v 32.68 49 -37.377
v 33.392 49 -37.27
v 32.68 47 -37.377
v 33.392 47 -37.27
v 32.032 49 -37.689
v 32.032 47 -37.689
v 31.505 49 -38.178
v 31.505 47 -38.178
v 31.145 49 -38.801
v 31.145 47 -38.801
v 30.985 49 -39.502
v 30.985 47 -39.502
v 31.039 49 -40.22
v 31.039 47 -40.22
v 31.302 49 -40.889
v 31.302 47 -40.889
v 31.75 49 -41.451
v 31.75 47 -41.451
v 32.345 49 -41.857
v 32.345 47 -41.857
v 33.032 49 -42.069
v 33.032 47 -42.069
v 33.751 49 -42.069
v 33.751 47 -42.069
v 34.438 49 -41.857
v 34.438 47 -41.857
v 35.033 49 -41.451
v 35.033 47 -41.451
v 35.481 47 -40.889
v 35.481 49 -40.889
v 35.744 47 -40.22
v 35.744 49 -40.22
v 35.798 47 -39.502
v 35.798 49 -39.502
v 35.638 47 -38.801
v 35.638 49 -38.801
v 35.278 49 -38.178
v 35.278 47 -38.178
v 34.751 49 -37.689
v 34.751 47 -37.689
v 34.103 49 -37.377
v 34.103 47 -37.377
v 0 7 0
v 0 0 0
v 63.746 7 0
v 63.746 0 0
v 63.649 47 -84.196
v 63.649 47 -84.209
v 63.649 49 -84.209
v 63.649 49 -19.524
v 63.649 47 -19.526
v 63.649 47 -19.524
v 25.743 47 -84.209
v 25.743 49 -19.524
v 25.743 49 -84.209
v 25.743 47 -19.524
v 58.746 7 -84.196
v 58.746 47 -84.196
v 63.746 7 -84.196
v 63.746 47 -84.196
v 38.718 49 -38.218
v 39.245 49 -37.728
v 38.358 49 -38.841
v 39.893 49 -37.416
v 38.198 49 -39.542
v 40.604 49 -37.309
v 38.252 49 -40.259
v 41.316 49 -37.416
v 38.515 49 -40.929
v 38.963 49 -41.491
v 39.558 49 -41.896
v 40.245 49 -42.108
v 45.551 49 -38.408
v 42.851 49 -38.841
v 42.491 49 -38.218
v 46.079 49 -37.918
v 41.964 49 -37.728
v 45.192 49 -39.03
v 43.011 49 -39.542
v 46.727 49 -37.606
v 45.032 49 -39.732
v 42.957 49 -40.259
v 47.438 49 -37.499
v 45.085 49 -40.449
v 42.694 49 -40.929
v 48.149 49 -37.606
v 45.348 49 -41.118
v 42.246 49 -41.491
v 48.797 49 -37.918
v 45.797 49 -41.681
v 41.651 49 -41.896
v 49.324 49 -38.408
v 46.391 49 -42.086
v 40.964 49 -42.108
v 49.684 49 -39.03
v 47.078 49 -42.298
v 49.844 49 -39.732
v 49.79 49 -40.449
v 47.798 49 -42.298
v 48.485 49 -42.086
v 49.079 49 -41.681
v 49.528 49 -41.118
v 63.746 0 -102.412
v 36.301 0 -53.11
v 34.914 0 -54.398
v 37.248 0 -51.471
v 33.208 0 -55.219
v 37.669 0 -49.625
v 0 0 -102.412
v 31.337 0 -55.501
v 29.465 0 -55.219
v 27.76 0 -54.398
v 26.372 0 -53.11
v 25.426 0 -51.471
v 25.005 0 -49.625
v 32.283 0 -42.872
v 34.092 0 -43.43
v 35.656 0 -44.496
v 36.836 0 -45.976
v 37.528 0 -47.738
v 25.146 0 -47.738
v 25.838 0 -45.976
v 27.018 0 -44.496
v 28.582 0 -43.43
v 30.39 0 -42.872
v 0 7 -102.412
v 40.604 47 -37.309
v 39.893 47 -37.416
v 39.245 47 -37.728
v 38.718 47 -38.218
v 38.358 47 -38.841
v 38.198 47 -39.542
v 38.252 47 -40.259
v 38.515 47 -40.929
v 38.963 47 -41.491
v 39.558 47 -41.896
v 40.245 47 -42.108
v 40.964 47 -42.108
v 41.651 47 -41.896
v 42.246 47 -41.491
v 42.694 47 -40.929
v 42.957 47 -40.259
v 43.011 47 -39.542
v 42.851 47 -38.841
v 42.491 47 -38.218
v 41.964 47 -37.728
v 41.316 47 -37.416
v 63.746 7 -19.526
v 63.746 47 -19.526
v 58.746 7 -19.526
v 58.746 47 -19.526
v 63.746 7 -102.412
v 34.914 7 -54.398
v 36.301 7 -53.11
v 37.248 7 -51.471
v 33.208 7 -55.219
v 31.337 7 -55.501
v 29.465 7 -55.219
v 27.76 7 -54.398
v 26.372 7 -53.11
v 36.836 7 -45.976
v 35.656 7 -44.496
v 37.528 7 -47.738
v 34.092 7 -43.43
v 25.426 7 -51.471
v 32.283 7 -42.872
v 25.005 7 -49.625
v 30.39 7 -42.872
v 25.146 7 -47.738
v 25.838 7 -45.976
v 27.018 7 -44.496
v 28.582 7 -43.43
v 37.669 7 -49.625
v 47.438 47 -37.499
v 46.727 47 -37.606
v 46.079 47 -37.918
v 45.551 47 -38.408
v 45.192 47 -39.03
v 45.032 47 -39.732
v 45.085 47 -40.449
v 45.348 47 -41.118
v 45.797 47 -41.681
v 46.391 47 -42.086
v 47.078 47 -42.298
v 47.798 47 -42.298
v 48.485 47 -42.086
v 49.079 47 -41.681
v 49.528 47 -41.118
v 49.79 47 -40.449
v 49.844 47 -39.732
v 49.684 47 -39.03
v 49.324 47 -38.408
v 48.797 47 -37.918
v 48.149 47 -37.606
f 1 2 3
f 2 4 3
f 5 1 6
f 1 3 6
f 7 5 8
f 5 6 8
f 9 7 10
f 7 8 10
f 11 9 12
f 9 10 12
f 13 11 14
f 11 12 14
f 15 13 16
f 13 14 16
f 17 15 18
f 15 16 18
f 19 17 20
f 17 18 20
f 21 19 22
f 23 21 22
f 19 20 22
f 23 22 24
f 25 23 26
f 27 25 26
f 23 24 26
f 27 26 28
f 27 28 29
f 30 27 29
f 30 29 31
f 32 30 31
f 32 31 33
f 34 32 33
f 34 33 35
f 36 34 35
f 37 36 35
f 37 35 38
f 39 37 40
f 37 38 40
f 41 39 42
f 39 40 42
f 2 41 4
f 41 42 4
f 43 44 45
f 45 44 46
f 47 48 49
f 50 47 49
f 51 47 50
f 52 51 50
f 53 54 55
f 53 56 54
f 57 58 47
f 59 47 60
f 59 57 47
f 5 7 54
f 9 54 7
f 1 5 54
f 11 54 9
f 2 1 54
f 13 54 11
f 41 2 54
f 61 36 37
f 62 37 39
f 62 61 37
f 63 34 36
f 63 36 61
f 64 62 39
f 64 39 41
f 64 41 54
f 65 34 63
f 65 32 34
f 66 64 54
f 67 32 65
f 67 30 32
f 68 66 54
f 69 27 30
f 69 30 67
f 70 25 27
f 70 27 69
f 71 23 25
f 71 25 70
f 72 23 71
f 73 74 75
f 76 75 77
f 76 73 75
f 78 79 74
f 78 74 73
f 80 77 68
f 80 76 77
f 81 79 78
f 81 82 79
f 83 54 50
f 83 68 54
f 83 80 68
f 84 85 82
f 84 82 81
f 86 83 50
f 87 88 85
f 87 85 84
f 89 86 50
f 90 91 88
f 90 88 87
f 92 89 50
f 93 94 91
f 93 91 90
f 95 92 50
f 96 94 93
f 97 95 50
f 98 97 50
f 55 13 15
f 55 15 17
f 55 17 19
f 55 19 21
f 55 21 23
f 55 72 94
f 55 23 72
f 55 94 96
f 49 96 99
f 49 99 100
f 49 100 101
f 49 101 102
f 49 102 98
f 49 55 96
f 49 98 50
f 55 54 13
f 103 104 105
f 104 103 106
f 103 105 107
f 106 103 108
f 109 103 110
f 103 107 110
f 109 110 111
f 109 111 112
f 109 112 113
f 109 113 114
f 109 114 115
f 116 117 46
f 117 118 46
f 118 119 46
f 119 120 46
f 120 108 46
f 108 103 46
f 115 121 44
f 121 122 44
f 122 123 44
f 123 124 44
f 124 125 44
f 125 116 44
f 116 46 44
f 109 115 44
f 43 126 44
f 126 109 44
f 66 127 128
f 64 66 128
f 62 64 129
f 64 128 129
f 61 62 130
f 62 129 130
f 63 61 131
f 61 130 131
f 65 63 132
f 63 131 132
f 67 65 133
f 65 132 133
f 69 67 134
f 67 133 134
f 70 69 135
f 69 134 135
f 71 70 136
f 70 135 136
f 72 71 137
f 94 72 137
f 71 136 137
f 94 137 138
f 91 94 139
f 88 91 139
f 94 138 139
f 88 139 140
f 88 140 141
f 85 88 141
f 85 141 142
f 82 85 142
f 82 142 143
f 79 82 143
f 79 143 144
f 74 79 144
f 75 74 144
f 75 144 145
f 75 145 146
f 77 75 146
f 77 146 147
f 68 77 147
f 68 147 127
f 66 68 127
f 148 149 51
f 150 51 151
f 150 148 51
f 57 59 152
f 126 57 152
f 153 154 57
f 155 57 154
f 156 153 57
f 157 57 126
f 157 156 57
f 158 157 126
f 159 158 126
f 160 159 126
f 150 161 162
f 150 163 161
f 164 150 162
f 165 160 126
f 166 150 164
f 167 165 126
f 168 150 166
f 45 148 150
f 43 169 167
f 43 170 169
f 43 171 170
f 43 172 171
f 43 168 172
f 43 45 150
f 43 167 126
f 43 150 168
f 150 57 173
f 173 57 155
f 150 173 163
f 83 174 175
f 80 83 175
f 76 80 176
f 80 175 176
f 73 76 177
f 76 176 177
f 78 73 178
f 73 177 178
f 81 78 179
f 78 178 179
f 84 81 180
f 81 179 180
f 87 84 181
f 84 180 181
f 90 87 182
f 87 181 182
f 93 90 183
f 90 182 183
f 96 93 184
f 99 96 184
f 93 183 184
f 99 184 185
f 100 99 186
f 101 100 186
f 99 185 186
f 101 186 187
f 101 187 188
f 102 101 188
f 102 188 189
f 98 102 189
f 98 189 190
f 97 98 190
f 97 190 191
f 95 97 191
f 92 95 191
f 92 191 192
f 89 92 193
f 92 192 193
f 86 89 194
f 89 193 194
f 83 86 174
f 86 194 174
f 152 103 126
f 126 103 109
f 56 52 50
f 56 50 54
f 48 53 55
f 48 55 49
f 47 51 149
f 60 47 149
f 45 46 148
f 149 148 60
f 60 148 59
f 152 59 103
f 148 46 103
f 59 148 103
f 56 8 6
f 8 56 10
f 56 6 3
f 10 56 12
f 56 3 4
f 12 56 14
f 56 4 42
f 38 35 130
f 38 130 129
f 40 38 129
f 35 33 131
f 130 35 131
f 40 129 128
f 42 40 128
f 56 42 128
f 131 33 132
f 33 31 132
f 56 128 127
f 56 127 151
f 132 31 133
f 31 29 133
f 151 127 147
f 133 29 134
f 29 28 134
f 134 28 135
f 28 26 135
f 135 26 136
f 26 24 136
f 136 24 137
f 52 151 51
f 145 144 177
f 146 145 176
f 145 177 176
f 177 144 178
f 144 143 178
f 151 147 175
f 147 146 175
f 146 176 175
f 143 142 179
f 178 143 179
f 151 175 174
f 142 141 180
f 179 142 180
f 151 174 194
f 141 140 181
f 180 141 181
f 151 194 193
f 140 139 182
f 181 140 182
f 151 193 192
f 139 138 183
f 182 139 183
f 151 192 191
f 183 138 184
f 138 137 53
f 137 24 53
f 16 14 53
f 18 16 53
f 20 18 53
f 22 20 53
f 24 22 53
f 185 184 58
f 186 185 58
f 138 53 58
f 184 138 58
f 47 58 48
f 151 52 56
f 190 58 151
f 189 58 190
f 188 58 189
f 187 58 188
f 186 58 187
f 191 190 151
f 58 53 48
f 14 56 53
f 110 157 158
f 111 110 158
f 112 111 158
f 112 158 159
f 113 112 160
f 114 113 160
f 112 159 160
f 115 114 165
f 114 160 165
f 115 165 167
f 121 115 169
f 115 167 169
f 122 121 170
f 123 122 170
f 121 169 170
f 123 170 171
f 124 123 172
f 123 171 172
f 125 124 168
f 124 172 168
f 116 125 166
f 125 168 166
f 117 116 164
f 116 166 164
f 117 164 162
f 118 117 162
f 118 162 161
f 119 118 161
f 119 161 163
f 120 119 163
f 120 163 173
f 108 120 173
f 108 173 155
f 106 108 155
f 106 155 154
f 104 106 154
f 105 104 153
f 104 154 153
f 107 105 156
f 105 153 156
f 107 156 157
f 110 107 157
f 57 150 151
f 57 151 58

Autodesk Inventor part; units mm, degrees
ref_plane "YZ Plane" through (0, 0, 0) normal (1, 0, 0) x (0, 1, 0)
ref_plane "XZ Plane" through (0, 0, 0) normal (0, 1, 0) x (-1, 0, 0)
ref_plane "XY Plane" through (0, 0, 0) normal (0, 0, 1) x (1, 0, 0)
sketch "Sketch1" plane through (0, 0, 0) normal (0, 1, 0) x (-1, 0, 0)
  line L0 (0, 0) -> (-63.7459, 0)
  line L1 (-63.7459, 0) -> (-63.7459, -102.4121)
  line L2 (-63.7459, -102.4121) -> (0, -102.4121)
  line L3 (0, -102.4121) -> (0, 0)
  line L4 (-57.4973, -89.9149) -> (-63.7459, -89.9149)
  line L5 (-63.7459, -89.9149) -> (-63.7459, -20.7341)
  circle A0 centre (-31.873, -51.2061) radius 6.35
extrude "Extrusion1" add sketch "Sketch1" along normal blind 7 contours L3 L2 L1 L0 | A0
sketch "Sketch2" plane through (0, 7, 0) normal (0, 1, 0) x (1, 0, 0)
  line L0 (63.7459, 0) -> (63.7459, 102.4121) projected
  line L1 (63.7459, 19.5256) -> (58.7459, 19.5256)
  line L2 (58.7459, 19.5256) -> (58.7459, 84.196)
  line L3 (58.7459, 84.196) -> (63.7459, 84.196)
  line L4 (63.7459, 84.196) -> (63.7459, 19.5256)
  point P0 (0, 0)
  dimension "d37" = 5
extrude "Extrusion2" add sketch "Sketch2" along normal blind 40
sketch "Sketch3" plane through (0, 47, 0) normal (0, 1, 0) x (1, 0, 0)
  point P0 (0, 0)
sketch "Sketch4" plane through (0, 47, 0) normal (0, 1, 0) x (1, 0, 0)
  line L0 (63.6489, 19.5244) -> (25.7429, 19.5244)
  line L1 (25.7429, 19.5244) -> (25.7429, 84.2091)
  line L2 (25.7429, 84.2091) -> (63.6489, 84.2091)
  line L3 (63.6489, 84.2091) -> (63.6489, 19.5244)
  point P0 (0, 0)
extrude "Extrusion3" add sketch "Sketch4" along normal blind 2
hole "Hole1" at (33.3915, 49, -39.6826) direction (0, -1, 0) diameter 4.826 end up to surface
hole "Hole2" at (40.6045, 49, -39.7222) direction (0, -1, 0) diameter 4.826 depth 4.7625
hole "Hole3" at (47.4379, 49, -39.912) direction (0, -1, 0) diameter 4.826 depth 4.7625
hole "Hole4" at (31.3368, 0, -49.1509) direction (0, 1, 0) diameter 12.7 depth 7.725
